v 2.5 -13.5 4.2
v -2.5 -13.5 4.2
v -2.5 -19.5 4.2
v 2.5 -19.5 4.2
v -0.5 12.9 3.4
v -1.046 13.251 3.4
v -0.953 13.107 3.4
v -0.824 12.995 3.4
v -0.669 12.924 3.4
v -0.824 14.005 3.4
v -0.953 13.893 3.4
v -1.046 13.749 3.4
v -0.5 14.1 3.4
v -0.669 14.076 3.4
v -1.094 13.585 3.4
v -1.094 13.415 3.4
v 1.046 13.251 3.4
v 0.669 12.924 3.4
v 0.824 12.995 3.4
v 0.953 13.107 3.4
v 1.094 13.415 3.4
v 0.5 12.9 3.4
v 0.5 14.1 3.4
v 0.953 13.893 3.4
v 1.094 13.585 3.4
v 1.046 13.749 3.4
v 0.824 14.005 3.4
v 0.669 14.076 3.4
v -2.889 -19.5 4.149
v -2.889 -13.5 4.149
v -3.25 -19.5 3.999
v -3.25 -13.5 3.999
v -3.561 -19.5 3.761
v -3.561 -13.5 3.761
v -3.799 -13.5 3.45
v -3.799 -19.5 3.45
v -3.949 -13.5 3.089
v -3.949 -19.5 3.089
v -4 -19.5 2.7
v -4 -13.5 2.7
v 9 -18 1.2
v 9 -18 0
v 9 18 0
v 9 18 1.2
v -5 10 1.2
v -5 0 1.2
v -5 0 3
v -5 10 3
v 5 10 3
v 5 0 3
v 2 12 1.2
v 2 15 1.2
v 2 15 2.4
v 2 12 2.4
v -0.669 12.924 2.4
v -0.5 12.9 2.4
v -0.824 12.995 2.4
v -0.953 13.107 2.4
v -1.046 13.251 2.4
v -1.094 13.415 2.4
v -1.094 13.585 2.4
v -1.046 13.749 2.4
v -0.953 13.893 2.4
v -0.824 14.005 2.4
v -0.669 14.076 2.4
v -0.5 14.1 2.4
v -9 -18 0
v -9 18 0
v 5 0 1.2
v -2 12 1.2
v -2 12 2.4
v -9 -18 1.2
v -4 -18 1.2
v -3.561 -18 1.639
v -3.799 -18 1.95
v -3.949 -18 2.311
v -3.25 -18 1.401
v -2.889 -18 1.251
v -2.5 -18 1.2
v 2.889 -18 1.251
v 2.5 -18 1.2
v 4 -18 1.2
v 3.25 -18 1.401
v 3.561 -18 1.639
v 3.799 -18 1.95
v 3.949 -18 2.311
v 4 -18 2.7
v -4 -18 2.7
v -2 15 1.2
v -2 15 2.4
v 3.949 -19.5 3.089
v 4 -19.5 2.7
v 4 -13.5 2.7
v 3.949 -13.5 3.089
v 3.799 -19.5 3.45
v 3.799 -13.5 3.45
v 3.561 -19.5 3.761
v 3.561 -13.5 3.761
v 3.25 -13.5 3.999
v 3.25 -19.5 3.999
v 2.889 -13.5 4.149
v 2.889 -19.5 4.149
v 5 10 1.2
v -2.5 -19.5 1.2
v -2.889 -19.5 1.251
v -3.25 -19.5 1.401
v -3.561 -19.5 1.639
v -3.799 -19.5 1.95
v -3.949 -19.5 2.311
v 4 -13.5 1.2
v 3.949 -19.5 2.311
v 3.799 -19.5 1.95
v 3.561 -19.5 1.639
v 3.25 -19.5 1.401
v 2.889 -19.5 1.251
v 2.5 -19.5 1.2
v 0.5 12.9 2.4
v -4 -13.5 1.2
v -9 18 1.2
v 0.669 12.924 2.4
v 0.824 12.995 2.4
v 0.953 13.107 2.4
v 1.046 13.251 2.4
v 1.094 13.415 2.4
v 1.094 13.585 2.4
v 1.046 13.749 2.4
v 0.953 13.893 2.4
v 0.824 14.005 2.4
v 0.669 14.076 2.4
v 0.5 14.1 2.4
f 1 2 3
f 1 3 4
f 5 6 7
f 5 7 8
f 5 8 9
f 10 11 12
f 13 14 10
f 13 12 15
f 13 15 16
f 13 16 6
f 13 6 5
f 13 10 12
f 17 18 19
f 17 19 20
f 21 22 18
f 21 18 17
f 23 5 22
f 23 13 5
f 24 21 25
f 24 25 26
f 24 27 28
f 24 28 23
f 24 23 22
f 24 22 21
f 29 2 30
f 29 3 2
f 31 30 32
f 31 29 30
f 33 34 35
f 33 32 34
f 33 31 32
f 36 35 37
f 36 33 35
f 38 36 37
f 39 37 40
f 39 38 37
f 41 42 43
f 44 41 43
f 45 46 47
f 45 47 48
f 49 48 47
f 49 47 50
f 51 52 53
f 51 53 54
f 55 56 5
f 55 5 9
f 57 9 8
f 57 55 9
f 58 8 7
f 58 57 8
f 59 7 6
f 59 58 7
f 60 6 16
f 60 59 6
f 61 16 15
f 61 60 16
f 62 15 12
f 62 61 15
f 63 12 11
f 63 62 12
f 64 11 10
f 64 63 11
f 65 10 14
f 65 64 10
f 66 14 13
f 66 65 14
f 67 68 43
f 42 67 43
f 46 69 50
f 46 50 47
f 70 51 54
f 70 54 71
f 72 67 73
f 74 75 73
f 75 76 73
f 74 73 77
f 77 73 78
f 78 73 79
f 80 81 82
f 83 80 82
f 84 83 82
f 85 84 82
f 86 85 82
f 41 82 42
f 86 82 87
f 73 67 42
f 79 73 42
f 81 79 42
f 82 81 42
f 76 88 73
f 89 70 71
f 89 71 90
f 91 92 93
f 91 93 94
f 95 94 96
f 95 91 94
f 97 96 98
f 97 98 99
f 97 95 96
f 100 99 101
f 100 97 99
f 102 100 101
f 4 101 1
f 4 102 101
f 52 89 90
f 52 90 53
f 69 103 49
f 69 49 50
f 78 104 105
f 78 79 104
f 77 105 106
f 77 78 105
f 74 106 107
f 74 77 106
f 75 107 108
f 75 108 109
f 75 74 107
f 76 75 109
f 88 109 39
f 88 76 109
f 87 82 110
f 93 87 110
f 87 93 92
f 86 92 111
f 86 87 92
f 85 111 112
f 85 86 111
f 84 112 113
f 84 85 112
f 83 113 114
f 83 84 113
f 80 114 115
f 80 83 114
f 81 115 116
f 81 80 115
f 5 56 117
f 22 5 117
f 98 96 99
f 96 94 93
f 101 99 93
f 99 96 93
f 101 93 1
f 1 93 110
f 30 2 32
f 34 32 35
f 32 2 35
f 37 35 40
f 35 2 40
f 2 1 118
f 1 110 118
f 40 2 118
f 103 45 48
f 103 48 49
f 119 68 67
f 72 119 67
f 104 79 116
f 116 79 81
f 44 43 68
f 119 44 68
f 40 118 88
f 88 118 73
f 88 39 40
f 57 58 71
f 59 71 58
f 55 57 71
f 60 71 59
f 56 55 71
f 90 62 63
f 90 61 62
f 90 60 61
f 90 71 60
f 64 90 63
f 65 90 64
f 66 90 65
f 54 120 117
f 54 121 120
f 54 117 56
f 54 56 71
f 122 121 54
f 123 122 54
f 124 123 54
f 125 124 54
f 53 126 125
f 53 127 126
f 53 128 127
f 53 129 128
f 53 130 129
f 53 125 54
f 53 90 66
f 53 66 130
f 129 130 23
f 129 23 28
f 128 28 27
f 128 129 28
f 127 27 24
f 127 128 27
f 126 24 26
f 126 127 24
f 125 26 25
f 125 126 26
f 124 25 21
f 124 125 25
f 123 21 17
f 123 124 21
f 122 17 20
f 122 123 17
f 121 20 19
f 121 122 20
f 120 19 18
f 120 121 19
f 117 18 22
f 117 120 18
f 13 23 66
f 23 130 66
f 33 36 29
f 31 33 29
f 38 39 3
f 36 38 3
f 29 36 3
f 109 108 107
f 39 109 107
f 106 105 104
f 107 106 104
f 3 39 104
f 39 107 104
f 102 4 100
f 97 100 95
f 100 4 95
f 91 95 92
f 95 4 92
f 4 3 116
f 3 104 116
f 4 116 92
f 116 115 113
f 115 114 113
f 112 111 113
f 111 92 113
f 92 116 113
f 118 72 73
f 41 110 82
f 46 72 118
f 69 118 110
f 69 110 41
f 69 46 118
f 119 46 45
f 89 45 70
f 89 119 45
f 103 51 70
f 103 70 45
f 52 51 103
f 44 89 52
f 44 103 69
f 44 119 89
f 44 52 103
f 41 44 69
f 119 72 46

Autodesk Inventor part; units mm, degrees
ref_plane "YZ Plane" through (0, 0, 0) normal (1, 0, 0) x (0, 1, 0)
ref_plane "XZ Plane" through (0, 0, 0) normal (0, 1, 0) x (-1, 0, 0)
ref_plane "XY Plane" through (0, 0, 0) normal (0, 0, 1) x (1, 0, 0)
sketch "Skizze1" plane through (0, 0, 0) normal (0, 0, 1) x (1, 0, 0)
  line L0 (-9, -18) -> (9, -18)
  line L1 (9, -18) -> (9, 18)
  line L2 (9, 18) -> (-9, 18)
  line L3 (-9, 18) -> (-9, -18)
  line L4 (-9, -18) -> (9, 18) construction
  line L5 (9, -18) -> (-9, 18) construction
  point P0 (0, 0)
  dimension "d0" = 18
  dimension "d1" = 36
extrude "Extrusion1" add sketch "Skizze1" along normal blind 1.2
sketch "Skizze5" plane through (0, 0, 1.2) normal (0, 0, 1) x (1, 0, 0)
  line L0 (4, -13.5) -> (-4, -13.5)
  line L1 (-4, -13.5) -> (-4, -19.5)
  line L2 (-4, -19.5) -> (4, -19.5)
  line L3 (4, -19.5) -> (4, -13.5)
  line L4 (4, -13.5) -> (-4, -19.5) construction
  line L5 (-4, -13.5) -> (4, -19.5) construction
  line L6 (-9, -18) -> (9, -18) projected
  point P0 (0, 0)
  point P1 (0, -16.5)
  point P2 (0, -16.5)
  dimension "d17" = 8
  dimension "d18" = 6
  dimension "d19" = 4.5
extrude "Extrusion5" add sketch "Skizze5" along normal blind 3
fillet "Rundung1" radius 1.5 4 edges at (4, -16.5, 4.2) (-4, -16.5, 4.2) (-4, -18.75, 1.2) (4, -18.75, 1.2)
sketch "Skizze3" plane through (0, 0, 1.2) normal (0, 0, 1) x (1, 0, 0)
  line L0 (2, 12) -> (-2, 12)
  line L1 (-2, 12) -> (-2, 15)
  line L2 (-2, 15) -> (2, 15)
  line L3 (2, 15) -> (2, 12)
  line L4 (2, 12) -> (-2, 15) construction
  line L5 (-2, 12) -> (2, 15) construction
  line L6 (9, 18) -> (-9, 18) projected
  point P0 (0, 0)
  point P1 (0, 13.5)
  point P2 (0, 13.5)
  dimension "d8" = 4
  dimension "d9" = 3
  dimension "d10" = 3
extrude "Extrusion3" add sketch "Skizze3" along normal blind 1.2
sketch "Skizze4" plane through (0, 0, 2.4) normal (0, 0, 1) x (1, 0, 0)
  line L0 (-0.5, 13.5) -> (0.5, 13.5) construction
  line L1 (-0.5, 12.9) -> (0.5, 12.9)
  line L2 (0.5, 14.1) -> (-0.5, 14.1)
  arc A0 (-0.5, 14.1) -> (-0.5, 12.9) centre (-0.5, 13.5) ccw
  arc A1 (0.5, 12.9) -> (0.5, 14.1) centre (0.5, 13.5) ccw
  line L3 (-2, 12) -> (2, 12) construction
  line L4 (2, 12) -> (2, 15) construction
  line L5 (2, 15) -> (-2, 15) construction
  line L6 (-2, 15) -> (-2, 12) construction
  line L7 (2, 15) -> (-2, 12) construction
  line L8 (-2, 15) -> (2, 12) construction
  point P0 (0, 0)
  point P1 (0, 13.5)
  point P2 (0, 13.5)
  dimension "d13" = 2.2
  dimension "d14" = 1.2
extrude "Extrusion4" add sketch "Skizze4" along normal blind 1
sketch "Skizze2" plane through (0, 0, 1.2) normal (0, 0, 1) x (1, 0, 0)
  line L0 (5, 0) -> (-5, 0)
  line L1 (-5, 0) -> (-5, 10)
  line L2 (-5, 10) -> (5, 10)
  line L3 (5, 10) -> (5, 0)
  line L4 (5, 0) -> (-5, 10) construction
  line L5 (-5, 0) -> (5, 10) construction
  line L6 (9, 18) -> (-9, 18) projected
  point P0 (0, 0)
  point P1 (0, 5)
  dimension "d4" = 10
  dimension "d5" = 8
extrude "Extrusion2" add sketch "Skizze2" along normal blind 1.8
properties part number "Teensy"
